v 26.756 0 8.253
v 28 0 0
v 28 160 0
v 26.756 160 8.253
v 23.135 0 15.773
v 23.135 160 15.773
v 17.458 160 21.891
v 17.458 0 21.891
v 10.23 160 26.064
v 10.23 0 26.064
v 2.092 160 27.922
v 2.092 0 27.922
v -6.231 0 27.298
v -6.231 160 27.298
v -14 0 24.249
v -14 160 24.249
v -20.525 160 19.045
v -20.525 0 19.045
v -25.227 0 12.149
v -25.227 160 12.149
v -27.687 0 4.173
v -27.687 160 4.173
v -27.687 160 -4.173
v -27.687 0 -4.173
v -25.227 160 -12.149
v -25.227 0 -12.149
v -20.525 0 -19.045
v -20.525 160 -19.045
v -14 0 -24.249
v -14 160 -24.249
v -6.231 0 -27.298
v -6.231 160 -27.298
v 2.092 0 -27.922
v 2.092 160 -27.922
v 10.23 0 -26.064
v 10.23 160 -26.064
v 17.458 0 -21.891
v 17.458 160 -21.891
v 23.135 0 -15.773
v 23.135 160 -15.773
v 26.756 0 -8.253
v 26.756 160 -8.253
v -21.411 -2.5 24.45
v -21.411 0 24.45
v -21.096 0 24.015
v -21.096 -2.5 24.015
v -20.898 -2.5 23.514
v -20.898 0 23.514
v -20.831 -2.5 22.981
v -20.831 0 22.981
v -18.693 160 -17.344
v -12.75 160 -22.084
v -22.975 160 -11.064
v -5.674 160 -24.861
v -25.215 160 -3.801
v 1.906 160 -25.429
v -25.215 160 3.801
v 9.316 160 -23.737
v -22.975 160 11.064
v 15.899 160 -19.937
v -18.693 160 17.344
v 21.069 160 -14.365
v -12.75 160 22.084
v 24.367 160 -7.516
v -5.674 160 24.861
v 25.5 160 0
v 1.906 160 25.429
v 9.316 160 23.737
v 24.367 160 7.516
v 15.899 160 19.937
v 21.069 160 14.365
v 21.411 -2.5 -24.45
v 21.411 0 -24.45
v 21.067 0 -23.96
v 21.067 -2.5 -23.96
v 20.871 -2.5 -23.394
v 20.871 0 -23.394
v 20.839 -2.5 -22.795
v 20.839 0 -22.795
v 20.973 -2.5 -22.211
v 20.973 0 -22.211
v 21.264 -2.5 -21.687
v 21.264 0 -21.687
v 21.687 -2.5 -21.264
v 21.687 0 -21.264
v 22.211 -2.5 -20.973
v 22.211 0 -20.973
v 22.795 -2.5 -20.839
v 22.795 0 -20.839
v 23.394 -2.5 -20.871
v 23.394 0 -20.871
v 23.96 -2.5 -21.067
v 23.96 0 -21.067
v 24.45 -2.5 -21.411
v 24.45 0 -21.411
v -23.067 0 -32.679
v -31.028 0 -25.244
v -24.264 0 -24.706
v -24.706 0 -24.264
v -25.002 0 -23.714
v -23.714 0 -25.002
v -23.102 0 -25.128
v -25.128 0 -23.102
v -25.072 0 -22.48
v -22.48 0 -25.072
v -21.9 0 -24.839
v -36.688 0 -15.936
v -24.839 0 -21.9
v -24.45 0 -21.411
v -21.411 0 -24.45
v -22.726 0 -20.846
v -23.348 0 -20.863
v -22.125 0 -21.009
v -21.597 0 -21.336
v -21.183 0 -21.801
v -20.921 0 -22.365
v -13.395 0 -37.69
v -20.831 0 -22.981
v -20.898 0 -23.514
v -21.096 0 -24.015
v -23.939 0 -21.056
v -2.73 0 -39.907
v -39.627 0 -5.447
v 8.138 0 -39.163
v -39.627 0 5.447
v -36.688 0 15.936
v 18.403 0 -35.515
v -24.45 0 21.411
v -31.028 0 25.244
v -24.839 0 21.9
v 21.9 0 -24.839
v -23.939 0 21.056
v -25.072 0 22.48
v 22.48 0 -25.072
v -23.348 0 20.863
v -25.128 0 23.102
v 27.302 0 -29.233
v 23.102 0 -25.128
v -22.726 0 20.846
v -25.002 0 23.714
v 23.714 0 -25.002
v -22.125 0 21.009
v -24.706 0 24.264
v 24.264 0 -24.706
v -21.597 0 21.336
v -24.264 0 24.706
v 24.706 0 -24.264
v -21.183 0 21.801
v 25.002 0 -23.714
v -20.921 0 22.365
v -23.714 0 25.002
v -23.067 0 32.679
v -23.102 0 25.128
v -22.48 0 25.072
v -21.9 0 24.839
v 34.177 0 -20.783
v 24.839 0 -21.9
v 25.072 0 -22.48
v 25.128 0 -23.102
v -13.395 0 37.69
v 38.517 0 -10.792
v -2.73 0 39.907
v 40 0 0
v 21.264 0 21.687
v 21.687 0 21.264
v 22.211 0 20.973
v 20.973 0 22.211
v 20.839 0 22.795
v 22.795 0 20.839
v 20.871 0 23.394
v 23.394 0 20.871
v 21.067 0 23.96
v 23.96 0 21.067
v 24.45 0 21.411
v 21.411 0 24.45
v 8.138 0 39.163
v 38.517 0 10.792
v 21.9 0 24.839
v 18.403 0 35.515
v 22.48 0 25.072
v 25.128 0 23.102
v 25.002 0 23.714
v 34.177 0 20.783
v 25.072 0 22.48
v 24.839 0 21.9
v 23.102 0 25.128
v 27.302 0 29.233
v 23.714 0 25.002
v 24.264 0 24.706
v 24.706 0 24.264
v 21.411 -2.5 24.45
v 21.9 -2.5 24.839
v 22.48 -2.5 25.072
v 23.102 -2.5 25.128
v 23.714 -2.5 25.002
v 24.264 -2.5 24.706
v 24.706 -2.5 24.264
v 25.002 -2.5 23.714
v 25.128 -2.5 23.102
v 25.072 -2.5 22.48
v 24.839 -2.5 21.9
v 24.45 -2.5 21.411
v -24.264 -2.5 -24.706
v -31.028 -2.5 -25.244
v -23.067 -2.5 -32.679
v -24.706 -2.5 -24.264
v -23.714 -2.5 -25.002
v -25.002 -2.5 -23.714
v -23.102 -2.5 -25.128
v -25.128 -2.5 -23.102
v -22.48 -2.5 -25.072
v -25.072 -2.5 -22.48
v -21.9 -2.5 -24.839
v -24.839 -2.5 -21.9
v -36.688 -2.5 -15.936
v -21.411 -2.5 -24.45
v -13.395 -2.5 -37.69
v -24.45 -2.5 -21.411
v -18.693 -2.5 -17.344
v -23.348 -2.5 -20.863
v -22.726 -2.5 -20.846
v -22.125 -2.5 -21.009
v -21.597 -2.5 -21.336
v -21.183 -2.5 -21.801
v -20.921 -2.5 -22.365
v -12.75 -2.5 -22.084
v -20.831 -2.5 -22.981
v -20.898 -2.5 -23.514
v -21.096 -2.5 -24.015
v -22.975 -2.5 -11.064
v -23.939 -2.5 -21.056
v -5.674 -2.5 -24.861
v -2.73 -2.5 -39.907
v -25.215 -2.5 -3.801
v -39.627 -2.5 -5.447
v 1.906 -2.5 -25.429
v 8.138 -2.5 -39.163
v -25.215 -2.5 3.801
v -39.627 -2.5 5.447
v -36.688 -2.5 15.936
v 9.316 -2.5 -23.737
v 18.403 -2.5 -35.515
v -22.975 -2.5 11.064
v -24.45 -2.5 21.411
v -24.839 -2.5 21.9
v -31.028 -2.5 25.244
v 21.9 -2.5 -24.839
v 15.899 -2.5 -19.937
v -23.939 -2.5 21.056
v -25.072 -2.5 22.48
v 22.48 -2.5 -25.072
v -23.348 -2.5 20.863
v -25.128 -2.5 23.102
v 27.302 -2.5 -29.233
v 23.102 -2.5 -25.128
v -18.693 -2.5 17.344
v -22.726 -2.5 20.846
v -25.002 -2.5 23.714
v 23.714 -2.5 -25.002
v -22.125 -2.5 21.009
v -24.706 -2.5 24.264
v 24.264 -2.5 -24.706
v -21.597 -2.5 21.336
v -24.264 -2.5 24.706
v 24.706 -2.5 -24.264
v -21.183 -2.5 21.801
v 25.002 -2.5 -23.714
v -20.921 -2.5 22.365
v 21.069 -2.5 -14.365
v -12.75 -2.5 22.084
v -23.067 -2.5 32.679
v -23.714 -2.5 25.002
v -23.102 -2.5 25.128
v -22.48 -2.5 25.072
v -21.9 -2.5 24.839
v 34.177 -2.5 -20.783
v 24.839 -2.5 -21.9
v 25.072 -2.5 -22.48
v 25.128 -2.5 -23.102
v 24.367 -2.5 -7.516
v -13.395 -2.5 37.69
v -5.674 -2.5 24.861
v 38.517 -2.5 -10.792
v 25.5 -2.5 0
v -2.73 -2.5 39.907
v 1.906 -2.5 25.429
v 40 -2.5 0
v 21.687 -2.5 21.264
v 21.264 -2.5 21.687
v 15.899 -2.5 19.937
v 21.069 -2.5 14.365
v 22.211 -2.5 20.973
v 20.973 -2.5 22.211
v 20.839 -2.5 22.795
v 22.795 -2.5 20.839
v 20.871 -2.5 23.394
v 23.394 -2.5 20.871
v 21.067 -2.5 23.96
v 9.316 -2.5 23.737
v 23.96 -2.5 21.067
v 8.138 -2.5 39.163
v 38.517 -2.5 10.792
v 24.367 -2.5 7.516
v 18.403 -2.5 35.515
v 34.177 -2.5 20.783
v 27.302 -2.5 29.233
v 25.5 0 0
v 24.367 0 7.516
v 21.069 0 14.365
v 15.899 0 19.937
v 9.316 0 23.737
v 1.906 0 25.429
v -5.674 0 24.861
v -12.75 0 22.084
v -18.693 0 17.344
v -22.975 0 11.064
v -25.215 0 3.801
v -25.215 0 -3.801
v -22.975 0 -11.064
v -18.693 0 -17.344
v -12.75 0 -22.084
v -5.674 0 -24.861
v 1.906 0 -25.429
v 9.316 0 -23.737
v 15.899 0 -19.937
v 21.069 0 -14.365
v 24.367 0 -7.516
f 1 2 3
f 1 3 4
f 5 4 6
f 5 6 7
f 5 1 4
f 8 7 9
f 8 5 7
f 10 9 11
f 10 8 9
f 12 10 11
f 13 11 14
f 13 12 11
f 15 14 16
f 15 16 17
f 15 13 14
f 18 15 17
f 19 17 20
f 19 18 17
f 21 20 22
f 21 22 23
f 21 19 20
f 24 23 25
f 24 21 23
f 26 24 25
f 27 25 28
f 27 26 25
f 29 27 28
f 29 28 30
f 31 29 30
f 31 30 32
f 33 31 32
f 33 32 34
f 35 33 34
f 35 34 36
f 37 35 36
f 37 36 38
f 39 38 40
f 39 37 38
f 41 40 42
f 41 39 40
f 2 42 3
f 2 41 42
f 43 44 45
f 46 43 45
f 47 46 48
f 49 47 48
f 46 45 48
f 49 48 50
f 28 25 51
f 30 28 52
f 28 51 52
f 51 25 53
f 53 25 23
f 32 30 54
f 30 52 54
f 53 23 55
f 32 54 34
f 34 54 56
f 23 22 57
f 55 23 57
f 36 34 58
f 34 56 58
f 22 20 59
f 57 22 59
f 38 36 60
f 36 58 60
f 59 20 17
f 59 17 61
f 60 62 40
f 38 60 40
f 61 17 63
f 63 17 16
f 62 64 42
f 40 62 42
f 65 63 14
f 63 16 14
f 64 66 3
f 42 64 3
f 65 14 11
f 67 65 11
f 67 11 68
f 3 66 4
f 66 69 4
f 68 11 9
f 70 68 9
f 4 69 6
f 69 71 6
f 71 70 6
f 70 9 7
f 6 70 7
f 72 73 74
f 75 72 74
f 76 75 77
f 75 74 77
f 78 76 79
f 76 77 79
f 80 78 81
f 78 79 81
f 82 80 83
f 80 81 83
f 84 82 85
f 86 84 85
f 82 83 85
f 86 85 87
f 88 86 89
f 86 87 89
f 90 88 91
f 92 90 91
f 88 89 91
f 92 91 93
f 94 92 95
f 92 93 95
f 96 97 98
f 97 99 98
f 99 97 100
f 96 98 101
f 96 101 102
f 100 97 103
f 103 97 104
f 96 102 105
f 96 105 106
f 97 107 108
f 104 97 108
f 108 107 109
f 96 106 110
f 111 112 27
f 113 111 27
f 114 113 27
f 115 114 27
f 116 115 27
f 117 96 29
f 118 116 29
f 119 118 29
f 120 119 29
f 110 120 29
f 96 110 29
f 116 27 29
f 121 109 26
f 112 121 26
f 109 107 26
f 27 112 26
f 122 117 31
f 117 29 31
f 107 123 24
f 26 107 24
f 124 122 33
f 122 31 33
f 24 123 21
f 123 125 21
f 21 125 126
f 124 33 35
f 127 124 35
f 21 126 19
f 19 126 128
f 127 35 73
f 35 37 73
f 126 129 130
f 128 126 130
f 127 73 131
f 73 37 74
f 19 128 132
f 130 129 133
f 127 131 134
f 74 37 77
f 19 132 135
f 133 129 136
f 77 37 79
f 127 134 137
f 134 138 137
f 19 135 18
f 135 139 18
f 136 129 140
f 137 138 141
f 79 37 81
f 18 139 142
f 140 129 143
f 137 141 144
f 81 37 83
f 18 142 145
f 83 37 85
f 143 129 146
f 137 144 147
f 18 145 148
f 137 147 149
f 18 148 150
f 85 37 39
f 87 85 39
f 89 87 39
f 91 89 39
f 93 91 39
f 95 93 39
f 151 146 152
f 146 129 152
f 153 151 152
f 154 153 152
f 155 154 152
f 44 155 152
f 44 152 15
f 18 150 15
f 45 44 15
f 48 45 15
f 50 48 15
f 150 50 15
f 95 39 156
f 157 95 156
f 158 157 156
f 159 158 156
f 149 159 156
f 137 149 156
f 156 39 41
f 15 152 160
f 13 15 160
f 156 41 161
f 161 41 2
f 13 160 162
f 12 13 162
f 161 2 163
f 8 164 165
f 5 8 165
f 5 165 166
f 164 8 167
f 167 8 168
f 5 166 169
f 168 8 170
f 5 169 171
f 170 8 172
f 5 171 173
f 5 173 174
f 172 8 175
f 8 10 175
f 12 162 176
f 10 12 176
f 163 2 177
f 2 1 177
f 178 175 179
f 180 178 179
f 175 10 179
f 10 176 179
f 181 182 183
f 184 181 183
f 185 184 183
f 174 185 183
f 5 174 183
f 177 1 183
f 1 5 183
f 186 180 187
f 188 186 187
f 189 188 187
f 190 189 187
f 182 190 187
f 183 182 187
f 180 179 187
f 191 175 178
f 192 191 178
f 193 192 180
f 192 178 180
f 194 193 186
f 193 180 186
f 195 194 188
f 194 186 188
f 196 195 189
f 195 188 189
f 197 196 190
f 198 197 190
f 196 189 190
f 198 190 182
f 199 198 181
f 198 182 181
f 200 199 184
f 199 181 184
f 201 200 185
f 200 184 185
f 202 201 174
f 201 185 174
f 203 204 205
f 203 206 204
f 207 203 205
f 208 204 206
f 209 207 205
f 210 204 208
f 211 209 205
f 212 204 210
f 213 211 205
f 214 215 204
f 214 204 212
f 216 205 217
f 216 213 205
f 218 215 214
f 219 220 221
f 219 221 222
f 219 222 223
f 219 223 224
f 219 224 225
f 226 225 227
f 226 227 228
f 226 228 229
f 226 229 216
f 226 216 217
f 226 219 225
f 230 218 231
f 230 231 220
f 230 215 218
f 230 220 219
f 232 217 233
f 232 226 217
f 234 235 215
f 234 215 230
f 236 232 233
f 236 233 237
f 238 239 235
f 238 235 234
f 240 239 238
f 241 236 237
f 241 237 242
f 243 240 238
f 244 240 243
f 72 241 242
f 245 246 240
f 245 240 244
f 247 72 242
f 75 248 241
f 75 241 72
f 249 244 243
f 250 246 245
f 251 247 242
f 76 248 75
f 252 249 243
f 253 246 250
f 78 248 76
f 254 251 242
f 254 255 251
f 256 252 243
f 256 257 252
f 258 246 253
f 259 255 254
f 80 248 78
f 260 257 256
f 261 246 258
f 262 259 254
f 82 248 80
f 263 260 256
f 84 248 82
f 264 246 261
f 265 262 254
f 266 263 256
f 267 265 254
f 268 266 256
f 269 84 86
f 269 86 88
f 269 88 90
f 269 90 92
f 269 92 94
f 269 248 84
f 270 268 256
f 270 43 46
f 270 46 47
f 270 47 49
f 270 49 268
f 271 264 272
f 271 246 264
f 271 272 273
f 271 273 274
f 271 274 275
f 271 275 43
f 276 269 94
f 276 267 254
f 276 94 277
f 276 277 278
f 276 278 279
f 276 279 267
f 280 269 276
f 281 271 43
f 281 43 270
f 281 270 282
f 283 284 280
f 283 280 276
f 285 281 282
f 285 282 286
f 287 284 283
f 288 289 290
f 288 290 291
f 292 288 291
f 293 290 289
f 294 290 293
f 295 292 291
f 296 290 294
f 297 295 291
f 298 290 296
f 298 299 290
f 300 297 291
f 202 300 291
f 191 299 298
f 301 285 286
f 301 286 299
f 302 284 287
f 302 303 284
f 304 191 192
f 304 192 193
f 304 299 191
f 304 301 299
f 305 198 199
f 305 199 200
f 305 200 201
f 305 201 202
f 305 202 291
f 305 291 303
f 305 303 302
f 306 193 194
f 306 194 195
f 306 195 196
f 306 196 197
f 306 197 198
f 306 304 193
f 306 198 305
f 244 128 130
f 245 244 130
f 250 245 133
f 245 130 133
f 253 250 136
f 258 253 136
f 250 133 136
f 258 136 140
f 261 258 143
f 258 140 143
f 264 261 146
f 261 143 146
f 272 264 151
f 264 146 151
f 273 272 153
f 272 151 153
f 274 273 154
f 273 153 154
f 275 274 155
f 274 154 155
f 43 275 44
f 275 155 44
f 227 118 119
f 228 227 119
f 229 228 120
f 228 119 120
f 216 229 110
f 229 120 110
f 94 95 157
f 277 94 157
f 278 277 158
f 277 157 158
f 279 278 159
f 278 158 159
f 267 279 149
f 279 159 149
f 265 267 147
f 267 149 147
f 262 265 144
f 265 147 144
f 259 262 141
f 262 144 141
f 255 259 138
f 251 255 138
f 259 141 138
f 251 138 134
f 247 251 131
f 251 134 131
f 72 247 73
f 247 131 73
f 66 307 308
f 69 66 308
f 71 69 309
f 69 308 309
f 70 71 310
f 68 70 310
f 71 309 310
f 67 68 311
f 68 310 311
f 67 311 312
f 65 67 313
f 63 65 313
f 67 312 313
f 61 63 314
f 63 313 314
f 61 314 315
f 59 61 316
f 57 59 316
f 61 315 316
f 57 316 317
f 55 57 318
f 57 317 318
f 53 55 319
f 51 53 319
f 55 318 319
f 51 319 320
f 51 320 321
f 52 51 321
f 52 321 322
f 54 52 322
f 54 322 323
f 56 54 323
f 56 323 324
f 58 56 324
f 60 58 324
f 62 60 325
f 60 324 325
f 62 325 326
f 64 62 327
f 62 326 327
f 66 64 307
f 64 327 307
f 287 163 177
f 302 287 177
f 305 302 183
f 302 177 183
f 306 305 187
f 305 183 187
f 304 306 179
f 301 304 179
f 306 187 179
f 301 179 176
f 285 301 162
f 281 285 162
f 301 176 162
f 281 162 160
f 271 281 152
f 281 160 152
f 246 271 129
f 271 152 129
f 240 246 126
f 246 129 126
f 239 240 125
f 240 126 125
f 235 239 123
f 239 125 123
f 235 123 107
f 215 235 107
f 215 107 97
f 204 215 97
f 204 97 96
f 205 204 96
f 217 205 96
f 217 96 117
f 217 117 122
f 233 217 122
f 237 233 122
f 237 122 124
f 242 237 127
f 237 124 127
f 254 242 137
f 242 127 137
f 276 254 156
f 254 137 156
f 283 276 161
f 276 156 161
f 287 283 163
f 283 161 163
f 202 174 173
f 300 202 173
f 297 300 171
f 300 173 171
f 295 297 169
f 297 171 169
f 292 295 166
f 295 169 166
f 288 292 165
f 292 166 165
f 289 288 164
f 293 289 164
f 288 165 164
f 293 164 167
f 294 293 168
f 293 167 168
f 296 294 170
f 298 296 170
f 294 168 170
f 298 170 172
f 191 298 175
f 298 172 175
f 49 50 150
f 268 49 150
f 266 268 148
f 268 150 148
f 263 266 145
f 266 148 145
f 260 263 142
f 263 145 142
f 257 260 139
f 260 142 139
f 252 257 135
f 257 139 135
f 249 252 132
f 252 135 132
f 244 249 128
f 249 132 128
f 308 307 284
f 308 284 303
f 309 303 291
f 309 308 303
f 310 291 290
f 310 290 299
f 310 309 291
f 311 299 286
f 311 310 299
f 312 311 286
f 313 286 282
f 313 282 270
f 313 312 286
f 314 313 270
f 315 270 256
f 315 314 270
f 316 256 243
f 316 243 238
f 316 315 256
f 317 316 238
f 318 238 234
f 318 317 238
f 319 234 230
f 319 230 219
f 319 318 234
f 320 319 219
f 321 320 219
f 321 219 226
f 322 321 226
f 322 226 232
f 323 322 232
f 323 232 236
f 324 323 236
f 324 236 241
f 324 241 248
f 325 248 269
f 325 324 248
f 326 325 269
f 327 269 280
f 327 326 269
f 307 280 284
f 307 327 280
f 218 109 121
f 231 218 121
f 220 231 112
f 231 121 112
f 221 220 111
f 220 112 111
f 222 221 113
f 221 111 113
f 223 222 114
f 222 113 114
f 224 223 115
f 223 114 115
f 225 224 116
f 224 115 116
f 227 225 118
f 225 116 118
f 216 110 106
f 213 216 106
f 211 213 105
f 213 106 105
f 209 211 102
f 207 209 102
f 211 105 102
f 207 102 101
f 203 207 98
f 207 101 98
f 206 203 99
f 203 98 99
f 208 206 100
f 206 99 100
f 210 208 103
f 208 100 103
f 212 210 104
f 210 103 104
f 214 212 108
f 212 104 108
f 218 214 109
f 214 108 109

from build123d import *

# Parameters (mm, degrees)
F0_R     = 40
F0_R_2   = 28
F0_R_3   = 25.5
F1_DEPTH = 2.5
F2_DEPTH = 160


with BuildPart() as f1:
    # F0 (on Front) → F1 (new body)
    with BuildSketch(Plane.XZ):
        Circle(F0_R)
        with BuildLine():
            ThreePointArc((24.4501319139, 21.4112365218), (30.4210394892, 11.4372355226), (32.5, 0))
            ThreePointArc((32.5, 0), (30.4210394892, -11.4372355226), (24.4501319139, -21.4112365218))
            ThreePointArc((24.4501319139, -21.4112365218), (24.9534304363, -22.1254580507), (25.1309703886, -22.9809703886))
            ThreePointArc((25.1309703886, -22.9809703886), (23.7707716884, -24.9806488394), (21.4112365218, -24.4501319139))
            ThreePointArc((21.4112365218, -24.4501319139), (0, -32.5), (-21.4112365218, -24.4501319139))
            ThreePointArc((-21.4112365218, -24.4501319139), (-24.5012499681, -24.5012499681), (-24.4501319139, -21.4112365218))
            ThreePointArc((-24.4501319139, -21.4112365218), (-32.5, 0), (-24.4501319139, 21.4112365218))
            ThreePointArc((-24.4501319139, 21.4112365218), (-24.5012499681, 24.5012499681), (-21.4112365218, 24.4501319139))
            ThreePointArc((-21.4112365218, 24.4501319139), (0, 32.5), (21.4112365218, 24.4501319139))
            ThreePointArc((21.4112365218, 24.4501319139), (23.7707716884, 24.9806488394), (25.1309703886, 22.9809703886))
            ThreePointArc((25.1309703886, 22.9809703886), (24.9534304363, 22.1254580507), (24.4501319139, 21.4112365218))
        make_face(mode=Mode.SUBTRACT)
        with BuildLine():
            ThreePointArc((24.4501319139, -21.4112365218), (30.4210394892, -11.4372355226), (32.5, 0))
            ThreePointArc((32.5, 0), (30.4210394892, 11.4372355226), (24.4501319139, 21.4112365218))
            ThreePointArc((24.4501319139, 21.4112365218), (21.460690809, 21.460690809), (21.4112365218, 24.4501319139))
            ThreePointArc((21.4112365218, 24.4501319139), (0, 32.5), (-21.4112365218, 24.4501319139))
            ThreePointArc((-21.4112365218, 24.4501319139), (-20.9812919377, 23.7707716884), (-20.8309703886, 22.9809703886))
            ThreePointArc((-20.8309703886, 22.9809703886), (-22.1254580507, 21.0085103409), (-24.4501319139, 21.4112365218))
            ThreePointArc((-24.4501319139, 21.4112365218), (-32.5, 0), (-24.4501319139, -21.4112365218))
            ThreePointArc((-24.4501319139, -21.4112365218), (-22.1254580507, -21.0085103409), (-20.8309703886, -22.9809703886))
            ThreePointArc((-20.8309703886, -22.9809703886), (-20.9812919377, -23.7707716884), (-21.4112365218, -24.4501319139))
            ThreePointArc((-21.4112365218, -24.4501319139), (0, -32.5), (21.4112365218, -24.4501319139))
            ThreePointArc((21.4112365218, -24.4501319139), (21.460690809, -21.460690809), (24.4501319139, -21.4112365218))
        make_face()
        Circle(F0_R_2, mode=Mode.SUBTRACT)
        Circle(F0_R_2)
        Circle(F0_R_3, mode=Mode.SUBTRACT)
    extrude(amount=F1_DEPTH)

    # F0 (on Front) → F2 (join)
    with BuildSketch(Plane.XZ):
        Circle(F0_R_2)
        Circle(F0_R_3, mode=Mode.SUBTRACT)
    extrude(amount=-F2_DEPTH)


solid = f1.part
